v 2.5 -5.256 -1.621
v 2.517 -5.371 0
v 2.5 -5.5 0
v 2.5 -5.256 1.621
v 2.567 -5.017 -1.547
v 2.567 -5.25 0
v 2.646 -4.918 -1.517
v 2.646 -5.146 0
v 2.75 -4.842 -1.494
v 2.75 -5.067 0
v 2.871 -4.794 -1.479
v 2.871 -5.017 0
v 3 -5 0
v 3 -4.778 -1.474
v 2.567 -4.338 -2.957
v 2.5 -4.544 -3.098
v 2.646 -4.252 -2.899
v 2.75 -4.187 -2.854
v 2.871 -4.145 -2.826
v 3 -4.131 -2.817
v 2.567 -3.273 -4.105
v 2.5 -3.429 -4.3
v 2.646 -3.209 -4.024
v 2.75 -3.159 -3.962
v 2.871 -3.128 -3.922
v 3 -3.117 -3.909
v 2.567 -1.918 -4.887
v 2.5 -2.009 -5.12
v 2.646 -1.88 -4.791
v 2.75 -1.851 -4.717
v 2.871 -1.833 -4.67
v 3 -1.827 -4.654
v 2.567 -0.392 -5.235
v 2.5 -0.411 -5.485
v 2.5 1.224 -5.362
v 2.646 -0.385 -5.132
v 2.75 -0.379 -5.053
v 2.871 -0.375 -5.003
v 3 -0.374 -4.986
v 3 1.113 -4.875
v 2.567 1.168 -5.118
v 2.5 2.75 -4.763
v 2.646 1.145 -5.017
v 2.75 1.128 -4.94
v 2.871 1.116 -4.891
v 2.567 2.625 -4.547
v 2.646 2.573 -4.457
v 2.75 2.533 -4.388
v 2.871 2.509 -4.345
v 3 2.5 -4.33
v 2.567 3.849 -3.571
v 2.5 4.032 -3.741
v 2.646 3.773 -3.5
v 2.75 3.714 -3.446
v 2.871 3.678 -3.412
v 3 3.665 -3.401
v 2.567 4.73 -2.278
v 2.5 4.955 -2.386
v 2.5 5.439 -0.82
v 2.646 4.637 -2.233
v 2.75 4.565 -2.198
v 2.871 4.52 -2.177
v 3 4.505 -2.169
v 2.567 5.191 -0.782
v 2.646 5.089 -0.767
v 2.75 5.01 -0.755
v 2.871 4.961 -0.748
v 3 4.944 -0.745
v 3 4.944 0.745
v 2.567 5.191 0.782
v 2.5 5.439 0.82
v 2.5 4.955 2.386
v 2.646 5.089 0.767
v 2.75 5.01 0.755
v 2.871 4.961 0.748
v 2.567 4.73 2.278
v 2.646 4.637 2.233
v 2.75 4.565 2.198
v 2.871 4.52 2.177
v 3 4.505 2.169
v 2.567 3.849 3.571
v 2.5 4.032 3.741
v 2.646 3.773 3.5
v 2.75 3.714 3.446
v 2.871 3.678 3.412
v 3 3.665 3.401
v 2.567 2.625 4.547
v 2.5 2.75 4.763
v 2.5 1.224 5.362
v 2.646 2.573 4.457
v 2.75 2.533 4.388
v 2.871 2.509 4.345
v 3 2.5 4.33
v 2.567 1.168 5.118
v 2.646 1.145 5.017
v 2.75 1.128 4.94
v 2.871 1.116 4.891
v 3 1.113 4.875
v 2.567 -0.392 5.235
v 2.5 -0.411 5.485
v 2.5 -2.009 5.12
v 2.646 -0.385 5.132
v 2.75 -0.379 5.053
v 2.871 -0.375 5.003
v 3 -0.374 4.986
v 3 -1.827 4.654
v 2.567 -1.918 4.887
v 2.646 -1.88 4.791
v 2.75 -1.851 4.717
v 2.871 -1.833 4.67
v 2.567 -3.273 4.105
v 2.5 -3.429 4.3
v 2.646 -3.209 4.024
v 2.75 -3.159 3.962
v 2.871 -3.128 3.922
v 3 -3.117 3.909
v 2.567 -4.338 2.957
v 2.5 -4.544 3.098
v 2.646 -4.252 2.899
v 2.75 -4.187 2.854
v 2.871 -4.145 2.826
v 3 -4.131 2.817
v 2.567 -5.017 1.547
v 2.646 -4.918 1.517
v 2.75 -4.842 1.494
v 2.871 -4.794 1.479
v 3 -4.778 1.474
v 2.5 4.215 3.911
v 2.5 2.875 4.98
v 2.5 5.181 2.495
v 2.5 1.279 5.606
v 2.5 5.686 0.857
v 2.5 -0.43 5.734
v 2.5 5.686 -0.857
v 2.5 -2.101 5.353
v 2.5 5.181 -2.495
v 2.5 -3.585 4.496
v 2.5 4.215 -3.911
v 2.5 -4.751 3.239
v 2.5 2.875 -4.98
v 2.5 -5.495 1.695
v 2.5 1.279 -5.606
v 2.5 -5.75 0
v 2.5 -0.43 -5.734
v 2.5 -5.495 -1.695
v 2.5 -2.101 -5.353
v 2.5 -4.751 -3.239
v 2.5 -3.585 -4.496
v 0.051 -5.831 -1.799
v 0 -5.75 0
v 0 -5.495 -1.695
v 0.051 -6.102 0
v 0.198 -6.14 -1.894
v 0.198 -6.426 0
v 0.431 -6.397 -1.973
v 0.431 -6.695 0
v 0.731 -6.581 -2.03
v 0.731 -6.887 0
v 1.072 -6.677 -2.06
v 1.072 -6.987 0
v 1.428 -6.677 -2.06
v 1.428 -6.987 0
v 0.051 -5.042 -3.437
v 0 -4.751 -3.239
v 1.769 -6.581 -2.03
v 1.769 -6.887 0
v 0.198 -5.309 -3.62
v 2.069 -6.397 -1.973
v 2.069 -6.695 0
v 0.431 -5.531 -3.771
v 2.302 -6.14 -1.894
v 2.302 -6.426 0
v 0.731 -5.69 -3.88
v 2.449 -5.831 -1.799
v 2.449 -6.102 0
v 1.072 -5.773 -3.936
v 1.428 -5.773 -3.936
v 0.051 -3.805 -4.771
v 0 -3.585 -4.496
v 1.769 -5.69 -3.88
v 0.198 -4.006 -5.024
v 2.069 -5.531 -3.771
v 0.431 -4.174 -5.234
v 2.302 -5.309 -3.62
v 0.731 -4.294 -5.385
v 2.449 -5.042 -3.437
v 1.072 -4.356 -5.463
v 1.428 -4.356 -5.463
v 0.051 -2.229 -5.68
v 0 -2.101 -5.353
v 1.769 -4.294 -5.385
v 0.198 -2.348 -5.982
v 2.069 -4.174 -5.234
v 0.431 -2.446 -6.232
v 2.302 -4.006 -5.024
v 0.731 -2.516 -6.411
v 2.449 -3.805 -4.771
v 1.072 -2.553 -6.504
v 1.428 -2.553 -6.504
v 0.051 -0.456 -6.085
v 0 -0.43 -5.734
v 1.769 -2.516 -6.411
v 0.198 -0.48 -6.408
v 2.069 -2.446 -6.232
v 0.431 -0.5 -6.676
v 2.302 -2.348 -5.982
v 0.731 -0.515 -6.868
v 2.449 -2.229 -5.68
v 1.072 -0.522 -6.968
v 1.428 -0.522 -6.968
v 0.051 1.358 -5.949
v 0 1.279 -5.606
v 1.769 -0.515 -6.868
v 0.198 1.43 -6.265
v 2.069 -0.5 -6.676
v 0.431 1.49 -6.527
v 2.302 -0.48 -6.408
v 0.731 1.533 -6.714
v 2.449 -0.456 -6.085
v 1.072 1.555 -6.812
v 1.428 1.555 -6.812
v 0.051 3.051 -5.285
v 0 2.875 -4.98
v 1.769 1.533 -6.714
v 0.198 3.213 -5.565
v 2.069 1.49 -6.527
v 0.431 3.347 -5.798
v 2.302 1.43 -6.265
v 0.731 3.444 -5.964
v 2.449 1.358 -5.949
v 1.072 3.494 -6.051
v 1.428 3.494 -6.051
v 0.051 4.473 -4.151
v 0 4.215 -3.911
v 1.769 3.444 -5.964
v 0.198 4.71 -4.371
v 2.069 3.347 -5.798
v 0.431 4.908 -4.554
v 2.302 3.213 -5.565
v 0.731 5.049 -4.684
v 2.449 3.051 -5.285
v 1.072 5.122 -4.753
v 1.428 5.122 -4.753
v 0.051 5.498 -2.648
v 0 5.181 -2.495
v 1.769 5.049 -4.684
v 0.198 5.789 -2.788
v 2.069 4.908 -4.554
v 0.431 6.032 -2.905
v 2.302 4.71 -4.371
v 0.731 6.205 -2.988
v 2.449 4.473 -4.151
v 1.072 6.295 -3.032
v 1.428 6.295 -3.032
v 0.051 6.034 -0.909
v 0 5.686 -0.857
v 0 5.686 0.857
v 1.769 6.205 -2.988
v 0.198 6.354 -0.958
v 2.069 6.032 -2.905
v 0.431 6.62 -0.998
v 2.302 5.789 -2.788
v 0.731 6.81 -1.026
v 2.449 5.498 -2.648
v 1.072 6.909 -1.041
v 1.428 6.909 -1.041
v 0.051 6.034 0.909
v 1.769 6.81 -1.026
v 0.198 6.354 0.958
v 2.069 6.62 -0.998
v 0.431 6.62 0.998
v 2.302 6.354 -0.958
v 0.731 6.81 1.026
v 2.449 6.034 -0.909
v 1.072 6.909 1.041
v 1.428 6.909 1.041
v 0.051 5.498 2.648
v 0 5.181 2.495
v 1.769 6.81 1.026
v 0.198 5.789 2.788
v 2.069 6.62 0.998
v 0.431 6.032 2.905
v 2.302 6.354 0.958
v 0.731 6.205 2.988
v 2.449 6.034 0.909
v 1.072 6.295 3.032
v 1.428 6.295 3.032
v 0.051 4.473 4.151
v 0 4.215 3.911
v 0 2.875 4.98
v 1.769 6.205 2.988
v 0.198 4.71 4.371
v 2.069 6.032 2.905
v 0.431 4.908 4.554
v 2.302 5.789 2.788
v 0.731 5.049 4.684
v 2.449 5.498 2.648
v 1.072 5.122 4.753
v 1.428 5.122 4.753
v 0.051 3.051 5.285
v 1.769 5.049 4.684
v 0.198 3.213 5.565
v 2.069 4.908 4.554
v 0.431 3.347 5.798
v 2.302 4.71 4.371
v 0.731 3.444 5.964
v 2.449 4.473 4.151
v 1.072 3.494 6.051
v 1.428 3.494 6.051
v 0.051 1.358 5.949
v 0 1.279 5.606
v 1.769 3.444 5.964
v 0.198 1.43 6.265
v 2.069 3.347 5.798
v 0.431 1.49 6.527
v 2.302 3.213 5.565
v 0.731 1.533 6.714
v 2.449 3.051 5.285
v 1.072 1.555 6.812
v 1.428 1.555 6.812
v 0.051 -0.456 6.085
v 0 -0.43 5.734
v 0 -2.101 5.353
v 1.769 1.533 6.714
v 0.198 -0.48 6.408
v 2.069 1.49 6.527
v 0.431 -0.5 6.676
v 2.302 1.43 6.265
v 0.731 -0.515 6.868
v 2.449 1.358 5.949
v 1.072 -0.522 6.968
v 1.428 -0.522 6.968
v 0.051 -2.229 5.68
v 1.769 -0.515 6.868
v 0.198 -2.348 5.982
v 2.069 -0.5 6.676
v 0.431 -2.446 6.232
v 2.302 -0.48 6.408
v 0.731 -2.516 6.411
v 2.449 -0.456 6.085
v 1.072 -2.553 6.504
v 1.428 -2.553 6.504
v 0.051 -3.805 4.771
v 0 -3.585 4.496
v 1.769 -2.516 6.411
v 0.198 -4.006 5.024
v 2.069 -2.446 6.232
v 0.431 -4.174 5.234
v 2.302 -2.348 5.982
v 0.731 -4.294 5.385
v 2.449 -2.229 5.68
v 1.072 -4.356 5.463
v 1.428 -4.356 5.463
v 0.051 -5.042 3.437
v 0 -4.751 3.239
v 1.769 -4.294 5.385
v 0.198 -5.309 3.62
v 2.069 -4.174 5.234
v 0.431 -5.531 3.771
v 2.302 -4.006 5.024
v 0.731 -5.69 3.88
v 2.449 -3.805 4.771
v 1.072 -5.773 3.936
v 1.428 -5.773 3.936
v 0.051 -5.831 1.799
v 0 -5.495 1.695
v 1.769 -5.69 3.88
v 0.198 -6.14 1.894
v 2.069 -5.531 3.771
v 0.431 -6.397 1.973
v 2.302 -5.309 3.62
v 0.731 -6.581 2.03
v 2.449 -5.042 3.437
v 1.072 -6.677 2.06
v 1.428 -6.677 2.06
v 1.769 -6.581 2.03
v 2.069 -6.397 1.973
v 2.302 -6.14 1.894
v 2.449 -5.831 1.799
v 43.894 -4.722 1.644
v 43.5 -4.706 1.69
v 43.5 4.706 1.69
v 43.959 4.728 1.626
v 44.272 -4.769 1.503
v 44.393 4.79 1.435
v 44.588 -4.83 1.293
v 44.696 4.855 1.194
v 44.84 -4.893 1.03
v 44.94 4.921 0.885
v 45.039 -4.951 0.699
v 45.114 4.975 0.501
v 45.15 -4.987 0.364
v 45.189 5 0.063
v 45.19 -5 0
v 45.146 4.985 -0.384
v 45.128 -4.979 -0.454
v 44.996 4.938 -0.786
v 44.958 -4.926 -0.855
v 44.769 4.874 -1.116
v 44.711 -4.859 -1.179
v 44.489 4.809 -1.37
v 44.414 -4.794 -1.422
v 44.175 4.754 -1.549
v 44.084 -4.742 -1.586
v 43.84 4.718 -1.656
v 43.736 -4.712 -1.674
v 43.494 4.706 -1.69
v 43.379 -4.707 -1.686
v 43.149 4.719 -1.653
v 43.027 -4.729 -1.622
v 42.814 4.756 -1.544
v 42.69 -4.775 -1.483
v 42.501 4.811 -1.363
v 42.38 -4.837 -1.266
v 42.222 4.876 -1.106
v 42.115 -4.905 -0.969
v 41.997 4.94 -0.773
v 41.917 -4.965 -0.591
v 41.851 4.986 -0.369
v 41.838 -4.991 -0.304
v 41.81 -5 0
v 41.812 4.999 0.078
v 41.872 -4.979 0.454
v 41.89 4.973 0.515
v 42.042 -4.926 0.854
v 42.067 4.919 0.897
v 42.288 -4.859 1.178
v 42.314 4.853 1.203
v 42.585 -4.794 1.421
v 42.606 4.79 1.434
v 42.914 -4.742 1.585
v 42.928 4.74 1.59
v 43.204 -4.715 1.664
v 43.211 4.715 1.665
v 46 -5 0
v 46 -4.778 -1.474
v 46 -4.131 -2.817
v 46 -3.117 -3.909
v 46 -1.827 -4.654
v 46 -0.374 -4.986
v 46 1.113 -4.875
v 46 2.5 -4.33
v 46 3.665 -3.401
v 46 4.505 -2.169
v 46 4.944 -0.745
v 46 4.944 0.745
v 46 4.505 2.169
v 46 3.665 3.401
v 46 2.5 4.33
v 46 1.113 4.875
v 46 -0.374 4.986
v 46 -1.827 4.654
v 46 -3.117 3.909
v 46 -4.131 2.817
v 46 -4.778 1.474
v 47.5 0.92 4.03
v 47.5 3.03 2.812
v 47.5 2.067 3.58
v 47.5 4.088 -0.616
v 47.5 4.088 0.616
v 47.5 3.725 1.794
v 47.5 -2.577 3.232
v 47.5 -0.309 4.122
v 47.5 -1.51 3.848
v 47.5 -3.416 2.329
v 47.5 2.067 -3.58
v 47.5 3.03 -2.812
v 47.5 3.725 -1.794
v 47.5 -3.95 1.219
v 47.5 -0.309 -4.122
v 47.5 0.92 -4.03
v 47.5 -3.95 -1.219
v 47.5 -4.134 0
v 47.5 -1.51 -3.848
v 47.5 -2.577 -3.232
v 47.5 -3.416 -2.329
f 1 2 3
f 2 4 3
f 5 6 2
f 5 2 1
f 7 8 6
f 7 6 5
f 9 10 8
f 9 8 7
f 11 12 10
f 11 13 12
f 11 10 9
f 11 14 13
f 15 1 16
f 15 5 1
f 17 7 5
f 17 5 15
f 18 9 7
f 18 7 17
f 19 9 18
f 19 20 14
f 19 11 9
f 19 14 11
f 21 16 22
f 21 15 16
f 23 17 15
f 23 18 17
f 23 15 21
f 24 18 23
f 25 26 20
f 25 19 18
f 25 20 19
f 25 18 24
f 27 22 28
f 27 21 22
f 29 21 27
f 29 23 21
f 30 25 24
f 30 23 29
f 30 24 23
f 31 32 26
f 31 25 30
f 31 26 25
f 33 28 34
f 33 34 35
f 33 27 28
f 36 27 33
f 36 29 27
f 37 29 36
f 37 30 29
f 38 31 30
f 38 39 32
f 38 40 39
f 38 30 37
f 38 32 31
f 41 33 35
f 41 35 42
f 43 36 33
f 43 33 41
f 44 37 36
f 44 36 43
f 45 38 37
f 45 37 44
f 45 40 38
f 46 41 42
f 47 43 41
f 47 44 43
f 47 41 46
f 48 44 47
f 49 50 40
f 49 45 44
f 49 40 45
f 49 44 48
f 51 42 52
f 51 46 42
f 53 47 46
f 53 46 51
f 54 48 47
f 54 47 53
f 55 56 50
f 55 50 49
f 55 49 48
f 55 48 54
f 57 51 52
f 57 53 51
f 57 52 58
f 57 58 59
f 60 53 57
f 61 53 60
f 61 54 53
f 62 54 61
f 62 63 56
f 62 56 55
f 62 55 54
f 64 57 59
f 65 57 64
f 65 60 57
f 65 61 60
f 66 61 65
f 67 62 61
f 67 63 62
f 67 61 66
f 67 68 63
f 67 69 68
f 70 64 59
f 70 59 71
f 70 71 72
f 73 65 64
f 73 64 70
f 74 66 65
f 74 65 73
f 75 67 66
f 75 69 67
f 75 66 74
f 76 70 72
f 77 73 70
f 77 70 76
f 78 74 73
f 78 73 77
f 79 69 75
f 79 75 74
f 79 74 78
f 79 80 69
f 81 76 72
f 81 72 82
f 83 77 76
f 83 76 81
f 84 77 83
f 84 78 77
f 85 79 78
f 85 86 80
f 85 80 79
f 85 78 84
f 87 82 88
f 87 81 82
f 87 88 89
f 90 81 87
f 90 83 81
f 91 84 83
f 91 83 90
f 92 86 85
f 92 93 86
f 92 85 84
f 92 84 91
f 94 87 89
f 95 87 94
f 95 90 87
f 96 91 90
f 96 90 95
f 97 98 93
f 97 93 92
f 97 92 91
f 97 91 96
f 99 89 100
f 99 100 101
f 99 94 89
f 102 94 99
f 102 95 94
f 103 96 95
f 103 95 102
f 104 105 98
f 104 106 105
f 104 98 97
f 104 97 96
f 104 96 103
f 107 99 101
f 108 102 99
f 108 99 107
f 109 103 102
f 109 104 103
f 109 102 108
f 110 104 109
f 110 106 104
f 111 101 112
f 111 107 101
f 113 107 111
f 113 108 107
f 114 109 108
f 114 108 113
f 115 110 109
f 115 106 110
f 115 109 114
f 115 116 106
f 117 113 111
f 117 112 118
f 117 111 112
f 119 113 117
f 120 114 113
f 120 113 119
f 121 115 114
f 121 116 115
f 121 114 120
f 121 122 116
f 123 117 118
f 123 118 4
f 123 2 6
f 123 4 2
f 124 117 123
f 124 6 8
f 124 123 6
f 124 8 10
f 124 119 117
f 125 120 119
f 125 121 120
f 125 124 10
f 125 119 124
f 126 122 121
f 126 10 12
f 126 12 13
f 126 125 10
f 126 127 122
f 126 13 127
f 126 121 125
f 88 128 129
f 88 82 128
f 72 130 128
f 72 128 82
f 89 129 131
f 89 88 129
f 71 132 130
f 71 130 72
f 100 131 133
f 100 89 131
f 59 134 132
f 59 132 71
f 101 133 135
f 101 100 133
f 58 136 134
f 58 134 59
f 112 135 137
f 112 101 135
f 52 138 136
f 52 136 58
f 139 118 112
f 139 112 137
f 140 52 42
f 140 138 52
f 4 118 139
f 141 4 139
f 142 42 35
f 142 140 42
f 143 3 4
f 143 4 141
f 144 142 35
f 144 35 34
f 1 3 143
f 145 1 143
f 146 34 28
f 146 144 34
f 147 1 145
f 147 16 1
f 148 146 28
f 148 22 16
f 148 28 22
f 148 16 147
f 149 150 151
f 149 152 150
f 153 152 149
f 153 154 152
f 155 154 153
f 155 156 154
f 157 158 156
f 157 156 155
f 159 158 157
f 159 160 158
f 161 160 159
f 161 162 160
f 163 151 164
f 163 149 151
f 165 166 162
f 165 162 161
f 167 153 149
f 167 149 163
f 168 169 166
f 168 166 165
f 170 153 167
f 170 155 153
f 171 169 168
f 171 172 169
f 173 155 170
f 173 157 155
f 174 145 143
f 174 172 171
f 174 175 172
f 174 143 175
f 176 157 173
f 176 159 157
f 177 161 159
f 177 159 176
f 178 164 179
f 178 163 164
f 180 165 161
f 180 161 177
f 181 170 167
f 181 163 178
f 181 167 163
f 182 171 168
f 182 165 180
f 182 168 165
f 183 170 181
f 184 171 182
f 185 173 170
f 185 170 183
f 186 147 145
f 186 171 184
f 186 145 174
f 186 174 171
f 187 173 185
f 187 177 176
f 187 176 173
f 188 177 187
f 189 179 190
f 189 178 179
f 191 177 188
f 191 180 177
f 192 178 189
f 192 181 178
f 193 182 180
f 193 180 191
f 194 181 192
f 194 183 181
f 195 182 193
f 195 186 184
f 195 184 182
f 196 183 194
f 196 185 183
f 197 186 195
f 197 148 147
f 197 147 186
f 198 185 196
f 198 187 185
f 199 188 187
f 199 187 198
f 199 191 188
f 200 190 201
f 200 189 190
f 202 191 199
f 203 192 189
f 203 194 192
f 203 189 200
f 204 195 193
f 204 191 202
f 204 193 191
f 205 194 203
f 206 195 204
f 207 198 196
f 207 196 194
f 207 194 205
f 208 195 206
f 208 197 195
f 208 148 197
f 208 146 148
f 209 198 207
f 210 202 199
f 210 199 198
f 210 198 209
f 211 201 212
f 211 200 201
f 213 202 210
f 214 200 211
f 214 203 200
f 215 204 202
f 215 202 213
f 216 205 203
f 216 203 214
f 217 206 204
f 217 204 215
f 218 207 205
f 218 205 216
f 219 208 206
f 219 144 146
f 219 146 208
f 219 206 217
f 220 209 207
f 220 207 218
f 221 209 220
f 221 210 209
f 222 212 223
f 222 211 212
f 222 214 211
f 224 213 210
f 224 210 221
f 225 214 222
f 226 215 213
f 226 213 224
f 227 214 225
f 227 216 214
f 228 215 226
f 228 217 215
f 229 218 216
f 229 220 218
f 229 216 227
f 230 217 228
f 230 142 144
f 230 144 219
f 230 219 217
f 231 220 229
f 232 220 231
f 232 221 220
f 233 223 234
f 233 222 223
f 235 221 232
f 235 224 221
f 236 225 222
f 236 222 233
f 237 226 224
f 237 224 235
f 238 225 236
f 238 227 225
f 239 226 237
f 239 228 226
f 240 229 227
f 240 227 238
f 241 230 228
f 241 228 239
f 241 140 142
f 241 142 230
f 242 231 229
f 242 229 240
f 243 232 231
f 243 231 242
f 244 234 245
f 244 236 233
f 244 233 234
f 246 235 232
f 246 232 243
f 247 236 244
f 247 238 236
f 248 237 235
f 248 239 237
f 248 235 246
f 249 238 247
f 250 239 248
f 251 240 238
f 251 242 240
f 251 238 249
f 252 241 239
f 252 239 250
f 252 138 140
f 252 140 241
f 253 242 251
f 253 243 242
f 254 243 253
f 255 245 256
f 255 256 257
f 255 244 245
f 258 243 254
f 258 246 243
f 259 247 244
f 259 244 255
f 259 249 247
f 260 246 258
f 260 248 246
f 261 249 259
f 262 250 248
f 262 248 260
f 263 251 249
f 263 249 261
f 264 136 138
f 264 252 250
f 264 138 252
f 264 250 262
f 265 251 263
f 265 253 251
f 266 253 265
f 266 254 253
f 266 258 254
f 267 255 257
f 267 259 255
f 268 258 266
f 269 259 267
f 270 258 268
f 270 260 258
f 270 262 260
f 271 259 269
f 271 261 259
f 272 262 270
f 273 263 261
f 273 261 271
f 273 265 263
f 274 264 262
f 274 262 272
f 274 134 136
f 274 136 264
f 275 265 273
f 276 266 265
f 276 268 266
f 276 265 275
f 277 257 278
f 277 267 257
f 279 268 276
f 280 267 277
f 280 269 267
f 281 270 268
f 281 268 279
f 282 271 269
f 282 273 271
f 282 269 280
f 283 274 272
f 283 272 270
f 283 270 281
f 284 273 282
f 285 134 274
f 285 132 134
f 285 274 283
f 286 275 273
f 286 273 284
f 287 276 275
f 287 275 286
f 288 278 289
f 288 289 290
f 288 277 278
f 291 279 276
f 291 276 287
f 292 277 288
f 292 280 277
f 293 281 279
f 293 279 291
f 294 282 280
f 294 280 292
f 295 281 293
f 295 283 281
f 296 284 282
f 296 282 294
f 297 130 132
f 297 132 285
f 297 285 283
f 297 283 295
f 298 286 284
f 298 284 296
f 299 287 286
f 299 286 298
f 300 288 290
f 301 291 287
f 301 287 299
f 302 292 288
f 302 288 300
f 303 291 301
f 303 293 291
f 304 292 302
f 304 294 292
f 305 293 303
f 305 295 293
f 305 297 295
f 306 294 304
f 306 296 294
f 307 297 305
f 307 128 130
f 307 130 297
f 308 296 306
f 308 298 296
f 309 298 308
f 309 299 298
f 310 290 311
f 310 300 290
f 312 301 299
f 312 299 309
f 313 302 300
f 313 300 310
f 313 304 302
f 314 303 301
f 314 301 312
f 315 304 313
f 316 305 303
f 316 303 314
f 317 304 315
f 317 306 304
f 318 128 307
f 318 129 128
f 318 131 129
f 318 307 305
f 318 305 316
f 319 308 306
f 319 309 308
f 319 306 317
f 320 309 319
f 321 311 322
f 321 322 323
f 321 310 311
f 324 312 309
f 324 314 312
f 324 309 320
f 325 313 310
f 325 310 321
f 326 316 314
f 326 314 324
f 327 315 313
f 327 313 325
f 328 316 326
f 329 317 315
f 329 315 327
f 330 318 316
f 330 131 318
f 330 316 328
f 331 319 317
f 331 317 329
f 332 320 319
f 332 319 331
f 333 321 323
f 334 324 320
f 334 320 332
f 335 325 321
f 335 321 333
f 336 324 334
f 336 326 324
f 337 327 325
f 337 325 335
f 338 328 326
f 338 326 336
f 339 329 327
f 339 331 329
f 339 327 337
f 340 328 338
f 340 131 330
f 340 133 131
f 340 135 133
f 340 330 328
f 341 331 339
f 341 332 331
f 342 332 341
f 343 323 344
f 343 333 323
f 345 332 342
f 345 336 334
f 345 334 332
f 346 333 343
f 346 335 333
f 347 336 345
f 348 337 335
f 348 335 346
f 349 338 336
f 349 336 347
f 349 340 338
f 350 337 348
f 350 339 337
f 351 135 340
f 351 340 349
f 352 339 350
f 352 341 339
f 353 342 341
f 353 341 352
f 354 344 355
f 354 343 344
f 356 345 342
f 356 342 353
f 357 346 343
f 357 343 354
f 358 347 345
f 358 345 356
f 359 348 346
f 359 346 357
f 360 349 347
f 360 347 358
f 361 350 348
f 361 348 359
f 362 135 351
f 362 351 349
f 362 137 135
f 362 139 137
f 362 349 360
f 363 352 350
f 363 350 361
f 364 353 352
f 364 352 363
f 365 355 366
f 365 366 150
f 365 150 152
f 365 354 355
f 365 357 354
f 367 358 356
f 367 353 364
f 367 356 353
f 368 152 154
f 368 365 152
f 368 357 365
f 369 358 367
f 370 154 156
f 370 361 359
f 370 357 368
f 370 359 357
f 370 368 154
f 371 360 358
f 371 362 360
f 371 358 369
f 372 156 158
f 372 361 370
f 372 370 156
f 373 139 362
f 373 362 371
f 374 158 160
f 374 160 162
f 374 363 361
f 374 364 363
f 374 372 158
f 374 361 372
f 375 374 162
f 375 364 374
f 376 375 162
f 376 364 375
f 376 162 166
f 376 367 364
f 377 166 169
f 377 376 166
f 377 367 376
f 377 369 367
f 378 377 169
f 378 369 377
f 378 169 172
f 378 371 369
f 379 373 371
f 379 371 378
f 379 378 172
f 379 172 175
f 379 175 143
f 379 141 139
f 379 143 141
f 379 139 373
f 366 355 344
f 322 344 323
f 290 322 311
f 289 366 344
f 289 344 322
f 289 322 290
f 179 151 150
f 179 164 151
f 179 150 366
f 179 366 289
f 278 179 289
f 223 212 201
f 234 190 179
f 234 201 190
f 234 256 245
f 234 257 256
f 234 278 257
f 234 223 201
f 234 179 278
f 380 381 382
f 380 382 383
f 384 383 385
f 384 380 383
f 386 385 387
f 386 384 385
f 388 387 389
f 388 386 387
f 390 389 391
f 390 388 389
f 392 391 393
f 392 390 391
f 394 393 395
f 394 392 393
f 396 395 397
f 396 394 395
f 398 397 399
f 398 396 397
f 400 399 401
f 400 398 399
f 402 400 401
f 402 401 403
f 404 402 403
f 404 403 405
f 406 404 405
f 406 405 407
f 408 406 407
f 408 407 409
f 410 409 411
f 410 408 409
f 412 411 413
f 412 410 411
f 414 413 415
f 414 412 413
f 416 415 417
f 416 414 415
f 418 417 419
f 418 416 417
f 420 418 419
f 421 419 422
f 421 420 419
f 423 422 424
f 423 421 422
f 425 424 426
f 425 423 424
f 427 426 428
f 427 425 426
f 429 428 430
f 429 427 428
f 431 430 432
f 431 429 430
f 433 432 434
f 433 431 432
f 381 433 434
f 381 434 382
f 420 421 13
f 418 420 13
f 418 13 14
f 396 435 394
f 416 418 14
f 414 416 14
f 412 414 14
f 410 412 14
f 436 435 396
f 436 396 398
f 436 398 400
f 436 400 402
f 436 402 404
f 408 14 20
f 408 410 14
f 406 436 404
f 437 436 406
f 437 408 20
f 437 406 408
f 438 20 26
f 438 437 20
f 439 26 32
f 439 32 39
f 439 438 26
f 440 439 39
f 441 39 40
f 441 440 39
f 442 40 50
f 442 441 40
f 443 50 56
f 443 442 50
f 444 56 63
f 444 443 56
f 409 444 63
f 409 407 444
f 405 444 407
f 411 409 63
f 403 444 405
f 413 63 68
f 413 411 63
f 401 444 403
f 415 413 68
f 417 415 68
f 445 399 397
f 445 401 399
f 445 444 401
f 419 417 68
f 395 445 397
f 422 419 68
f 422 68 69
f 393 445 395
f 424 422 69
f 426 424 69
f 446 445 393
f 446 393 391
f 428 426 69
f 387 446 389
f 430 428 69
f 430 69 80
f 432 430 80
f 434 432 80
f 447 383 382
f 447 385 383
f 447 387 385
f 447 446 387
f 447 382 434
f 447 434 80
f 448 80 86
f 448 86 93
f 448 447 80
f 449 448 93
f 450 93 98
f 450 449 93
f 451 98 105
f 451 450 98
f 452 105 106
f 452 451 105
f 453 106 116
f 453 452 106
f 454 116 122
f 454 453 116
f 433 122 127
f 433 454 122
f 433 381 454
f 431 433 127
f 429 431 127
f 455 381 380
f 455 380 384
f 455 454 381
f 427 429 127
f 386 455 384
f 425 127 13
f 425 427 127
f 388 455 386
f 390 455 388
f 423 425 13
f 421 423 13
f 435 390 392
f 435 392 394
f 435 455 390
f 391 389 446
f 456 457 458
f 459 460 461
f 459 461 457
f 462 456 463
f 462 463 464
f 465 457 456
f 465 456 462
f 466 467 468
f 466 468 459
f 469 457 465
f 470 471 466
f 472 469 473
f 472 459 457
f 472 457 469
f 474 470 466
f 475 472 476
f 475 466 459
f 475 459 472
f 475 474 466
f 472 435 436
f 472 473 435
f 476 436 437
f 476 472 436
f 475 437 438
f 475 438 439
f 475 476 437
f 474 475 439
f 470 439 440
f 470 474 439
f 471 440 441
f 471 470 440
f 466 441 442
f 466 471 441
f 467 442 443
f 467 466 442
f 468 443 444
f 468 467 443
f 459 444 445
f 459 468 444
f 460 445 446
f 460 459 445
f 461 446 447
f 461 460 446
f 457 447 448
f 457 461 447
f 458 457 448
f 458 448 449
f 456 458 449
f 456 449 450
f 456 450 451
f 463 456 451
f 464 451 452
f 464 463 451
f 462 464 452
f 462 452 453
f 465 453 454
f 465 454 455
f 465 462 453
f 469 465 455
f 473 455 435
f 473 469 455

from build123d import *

# Parameters (mm, degrees)
CHAMFER1_R      = 0.5
HOLE_DEPTH      = 49.520614205
HOLE_DEPTH_BACK = 49.520614205
SKETCH2_R       = 1.69


with BuildPart() as part:
    # Sketch1 → BaseBody (revolve)
    with BuildSketch(Plane.XY, mode=Mode.PRIVATE) as basebody_sk:
        with BuildLine():
            Line((47.5, 0), (0, 0))
            Line((0, 0), (0, 5.75))
            ThreePointArc((0, 5.75), (1.25, 7), (2.5, 5.75))
            Line((2.5, 5.75), (2.5, 5))
            Line((2.5, 5), (46, 5))
            Line((46, 5), (47.5, 4.133974596))
            Line((47.5, 4.133974596), (47.5, 0))
        make_face()
    revolve(basebody_sk.sketch.rotate(Axis((-19.830028721, 0, 0), (1, 0, 0)), 180), axis=Axis((-19.830028721, 0, 0), (1, 0, 0)))

    # Chamfer1
    chamfer1_edges = [part.edges().sort_by_distance(p)[0] for p in [
        (2.5, 5, 0),
    ]]
    fillet(chamfer1_edges, radius=CHAMFER1_R)

    # Sketch2 → Hole (cut, two sides: drawn at the far end of the back side and taken through both)
    with BuildSketch(Plane(origin=(0, 0, 0), x_dir=(1, 0, 0), z_dir=(0, 1, 0)).offset(-HOLE_DEPTH_BACK)):
        with Locations(Location((43.5, 0, 0), (0, 0, 270))):
            Circle(SKETCH2_R)
    extrude(amount=HOLE_DEPTH + HOLE_DEPTH_BACK, mode=Mode.SUBTRACT)


solid = part.part
